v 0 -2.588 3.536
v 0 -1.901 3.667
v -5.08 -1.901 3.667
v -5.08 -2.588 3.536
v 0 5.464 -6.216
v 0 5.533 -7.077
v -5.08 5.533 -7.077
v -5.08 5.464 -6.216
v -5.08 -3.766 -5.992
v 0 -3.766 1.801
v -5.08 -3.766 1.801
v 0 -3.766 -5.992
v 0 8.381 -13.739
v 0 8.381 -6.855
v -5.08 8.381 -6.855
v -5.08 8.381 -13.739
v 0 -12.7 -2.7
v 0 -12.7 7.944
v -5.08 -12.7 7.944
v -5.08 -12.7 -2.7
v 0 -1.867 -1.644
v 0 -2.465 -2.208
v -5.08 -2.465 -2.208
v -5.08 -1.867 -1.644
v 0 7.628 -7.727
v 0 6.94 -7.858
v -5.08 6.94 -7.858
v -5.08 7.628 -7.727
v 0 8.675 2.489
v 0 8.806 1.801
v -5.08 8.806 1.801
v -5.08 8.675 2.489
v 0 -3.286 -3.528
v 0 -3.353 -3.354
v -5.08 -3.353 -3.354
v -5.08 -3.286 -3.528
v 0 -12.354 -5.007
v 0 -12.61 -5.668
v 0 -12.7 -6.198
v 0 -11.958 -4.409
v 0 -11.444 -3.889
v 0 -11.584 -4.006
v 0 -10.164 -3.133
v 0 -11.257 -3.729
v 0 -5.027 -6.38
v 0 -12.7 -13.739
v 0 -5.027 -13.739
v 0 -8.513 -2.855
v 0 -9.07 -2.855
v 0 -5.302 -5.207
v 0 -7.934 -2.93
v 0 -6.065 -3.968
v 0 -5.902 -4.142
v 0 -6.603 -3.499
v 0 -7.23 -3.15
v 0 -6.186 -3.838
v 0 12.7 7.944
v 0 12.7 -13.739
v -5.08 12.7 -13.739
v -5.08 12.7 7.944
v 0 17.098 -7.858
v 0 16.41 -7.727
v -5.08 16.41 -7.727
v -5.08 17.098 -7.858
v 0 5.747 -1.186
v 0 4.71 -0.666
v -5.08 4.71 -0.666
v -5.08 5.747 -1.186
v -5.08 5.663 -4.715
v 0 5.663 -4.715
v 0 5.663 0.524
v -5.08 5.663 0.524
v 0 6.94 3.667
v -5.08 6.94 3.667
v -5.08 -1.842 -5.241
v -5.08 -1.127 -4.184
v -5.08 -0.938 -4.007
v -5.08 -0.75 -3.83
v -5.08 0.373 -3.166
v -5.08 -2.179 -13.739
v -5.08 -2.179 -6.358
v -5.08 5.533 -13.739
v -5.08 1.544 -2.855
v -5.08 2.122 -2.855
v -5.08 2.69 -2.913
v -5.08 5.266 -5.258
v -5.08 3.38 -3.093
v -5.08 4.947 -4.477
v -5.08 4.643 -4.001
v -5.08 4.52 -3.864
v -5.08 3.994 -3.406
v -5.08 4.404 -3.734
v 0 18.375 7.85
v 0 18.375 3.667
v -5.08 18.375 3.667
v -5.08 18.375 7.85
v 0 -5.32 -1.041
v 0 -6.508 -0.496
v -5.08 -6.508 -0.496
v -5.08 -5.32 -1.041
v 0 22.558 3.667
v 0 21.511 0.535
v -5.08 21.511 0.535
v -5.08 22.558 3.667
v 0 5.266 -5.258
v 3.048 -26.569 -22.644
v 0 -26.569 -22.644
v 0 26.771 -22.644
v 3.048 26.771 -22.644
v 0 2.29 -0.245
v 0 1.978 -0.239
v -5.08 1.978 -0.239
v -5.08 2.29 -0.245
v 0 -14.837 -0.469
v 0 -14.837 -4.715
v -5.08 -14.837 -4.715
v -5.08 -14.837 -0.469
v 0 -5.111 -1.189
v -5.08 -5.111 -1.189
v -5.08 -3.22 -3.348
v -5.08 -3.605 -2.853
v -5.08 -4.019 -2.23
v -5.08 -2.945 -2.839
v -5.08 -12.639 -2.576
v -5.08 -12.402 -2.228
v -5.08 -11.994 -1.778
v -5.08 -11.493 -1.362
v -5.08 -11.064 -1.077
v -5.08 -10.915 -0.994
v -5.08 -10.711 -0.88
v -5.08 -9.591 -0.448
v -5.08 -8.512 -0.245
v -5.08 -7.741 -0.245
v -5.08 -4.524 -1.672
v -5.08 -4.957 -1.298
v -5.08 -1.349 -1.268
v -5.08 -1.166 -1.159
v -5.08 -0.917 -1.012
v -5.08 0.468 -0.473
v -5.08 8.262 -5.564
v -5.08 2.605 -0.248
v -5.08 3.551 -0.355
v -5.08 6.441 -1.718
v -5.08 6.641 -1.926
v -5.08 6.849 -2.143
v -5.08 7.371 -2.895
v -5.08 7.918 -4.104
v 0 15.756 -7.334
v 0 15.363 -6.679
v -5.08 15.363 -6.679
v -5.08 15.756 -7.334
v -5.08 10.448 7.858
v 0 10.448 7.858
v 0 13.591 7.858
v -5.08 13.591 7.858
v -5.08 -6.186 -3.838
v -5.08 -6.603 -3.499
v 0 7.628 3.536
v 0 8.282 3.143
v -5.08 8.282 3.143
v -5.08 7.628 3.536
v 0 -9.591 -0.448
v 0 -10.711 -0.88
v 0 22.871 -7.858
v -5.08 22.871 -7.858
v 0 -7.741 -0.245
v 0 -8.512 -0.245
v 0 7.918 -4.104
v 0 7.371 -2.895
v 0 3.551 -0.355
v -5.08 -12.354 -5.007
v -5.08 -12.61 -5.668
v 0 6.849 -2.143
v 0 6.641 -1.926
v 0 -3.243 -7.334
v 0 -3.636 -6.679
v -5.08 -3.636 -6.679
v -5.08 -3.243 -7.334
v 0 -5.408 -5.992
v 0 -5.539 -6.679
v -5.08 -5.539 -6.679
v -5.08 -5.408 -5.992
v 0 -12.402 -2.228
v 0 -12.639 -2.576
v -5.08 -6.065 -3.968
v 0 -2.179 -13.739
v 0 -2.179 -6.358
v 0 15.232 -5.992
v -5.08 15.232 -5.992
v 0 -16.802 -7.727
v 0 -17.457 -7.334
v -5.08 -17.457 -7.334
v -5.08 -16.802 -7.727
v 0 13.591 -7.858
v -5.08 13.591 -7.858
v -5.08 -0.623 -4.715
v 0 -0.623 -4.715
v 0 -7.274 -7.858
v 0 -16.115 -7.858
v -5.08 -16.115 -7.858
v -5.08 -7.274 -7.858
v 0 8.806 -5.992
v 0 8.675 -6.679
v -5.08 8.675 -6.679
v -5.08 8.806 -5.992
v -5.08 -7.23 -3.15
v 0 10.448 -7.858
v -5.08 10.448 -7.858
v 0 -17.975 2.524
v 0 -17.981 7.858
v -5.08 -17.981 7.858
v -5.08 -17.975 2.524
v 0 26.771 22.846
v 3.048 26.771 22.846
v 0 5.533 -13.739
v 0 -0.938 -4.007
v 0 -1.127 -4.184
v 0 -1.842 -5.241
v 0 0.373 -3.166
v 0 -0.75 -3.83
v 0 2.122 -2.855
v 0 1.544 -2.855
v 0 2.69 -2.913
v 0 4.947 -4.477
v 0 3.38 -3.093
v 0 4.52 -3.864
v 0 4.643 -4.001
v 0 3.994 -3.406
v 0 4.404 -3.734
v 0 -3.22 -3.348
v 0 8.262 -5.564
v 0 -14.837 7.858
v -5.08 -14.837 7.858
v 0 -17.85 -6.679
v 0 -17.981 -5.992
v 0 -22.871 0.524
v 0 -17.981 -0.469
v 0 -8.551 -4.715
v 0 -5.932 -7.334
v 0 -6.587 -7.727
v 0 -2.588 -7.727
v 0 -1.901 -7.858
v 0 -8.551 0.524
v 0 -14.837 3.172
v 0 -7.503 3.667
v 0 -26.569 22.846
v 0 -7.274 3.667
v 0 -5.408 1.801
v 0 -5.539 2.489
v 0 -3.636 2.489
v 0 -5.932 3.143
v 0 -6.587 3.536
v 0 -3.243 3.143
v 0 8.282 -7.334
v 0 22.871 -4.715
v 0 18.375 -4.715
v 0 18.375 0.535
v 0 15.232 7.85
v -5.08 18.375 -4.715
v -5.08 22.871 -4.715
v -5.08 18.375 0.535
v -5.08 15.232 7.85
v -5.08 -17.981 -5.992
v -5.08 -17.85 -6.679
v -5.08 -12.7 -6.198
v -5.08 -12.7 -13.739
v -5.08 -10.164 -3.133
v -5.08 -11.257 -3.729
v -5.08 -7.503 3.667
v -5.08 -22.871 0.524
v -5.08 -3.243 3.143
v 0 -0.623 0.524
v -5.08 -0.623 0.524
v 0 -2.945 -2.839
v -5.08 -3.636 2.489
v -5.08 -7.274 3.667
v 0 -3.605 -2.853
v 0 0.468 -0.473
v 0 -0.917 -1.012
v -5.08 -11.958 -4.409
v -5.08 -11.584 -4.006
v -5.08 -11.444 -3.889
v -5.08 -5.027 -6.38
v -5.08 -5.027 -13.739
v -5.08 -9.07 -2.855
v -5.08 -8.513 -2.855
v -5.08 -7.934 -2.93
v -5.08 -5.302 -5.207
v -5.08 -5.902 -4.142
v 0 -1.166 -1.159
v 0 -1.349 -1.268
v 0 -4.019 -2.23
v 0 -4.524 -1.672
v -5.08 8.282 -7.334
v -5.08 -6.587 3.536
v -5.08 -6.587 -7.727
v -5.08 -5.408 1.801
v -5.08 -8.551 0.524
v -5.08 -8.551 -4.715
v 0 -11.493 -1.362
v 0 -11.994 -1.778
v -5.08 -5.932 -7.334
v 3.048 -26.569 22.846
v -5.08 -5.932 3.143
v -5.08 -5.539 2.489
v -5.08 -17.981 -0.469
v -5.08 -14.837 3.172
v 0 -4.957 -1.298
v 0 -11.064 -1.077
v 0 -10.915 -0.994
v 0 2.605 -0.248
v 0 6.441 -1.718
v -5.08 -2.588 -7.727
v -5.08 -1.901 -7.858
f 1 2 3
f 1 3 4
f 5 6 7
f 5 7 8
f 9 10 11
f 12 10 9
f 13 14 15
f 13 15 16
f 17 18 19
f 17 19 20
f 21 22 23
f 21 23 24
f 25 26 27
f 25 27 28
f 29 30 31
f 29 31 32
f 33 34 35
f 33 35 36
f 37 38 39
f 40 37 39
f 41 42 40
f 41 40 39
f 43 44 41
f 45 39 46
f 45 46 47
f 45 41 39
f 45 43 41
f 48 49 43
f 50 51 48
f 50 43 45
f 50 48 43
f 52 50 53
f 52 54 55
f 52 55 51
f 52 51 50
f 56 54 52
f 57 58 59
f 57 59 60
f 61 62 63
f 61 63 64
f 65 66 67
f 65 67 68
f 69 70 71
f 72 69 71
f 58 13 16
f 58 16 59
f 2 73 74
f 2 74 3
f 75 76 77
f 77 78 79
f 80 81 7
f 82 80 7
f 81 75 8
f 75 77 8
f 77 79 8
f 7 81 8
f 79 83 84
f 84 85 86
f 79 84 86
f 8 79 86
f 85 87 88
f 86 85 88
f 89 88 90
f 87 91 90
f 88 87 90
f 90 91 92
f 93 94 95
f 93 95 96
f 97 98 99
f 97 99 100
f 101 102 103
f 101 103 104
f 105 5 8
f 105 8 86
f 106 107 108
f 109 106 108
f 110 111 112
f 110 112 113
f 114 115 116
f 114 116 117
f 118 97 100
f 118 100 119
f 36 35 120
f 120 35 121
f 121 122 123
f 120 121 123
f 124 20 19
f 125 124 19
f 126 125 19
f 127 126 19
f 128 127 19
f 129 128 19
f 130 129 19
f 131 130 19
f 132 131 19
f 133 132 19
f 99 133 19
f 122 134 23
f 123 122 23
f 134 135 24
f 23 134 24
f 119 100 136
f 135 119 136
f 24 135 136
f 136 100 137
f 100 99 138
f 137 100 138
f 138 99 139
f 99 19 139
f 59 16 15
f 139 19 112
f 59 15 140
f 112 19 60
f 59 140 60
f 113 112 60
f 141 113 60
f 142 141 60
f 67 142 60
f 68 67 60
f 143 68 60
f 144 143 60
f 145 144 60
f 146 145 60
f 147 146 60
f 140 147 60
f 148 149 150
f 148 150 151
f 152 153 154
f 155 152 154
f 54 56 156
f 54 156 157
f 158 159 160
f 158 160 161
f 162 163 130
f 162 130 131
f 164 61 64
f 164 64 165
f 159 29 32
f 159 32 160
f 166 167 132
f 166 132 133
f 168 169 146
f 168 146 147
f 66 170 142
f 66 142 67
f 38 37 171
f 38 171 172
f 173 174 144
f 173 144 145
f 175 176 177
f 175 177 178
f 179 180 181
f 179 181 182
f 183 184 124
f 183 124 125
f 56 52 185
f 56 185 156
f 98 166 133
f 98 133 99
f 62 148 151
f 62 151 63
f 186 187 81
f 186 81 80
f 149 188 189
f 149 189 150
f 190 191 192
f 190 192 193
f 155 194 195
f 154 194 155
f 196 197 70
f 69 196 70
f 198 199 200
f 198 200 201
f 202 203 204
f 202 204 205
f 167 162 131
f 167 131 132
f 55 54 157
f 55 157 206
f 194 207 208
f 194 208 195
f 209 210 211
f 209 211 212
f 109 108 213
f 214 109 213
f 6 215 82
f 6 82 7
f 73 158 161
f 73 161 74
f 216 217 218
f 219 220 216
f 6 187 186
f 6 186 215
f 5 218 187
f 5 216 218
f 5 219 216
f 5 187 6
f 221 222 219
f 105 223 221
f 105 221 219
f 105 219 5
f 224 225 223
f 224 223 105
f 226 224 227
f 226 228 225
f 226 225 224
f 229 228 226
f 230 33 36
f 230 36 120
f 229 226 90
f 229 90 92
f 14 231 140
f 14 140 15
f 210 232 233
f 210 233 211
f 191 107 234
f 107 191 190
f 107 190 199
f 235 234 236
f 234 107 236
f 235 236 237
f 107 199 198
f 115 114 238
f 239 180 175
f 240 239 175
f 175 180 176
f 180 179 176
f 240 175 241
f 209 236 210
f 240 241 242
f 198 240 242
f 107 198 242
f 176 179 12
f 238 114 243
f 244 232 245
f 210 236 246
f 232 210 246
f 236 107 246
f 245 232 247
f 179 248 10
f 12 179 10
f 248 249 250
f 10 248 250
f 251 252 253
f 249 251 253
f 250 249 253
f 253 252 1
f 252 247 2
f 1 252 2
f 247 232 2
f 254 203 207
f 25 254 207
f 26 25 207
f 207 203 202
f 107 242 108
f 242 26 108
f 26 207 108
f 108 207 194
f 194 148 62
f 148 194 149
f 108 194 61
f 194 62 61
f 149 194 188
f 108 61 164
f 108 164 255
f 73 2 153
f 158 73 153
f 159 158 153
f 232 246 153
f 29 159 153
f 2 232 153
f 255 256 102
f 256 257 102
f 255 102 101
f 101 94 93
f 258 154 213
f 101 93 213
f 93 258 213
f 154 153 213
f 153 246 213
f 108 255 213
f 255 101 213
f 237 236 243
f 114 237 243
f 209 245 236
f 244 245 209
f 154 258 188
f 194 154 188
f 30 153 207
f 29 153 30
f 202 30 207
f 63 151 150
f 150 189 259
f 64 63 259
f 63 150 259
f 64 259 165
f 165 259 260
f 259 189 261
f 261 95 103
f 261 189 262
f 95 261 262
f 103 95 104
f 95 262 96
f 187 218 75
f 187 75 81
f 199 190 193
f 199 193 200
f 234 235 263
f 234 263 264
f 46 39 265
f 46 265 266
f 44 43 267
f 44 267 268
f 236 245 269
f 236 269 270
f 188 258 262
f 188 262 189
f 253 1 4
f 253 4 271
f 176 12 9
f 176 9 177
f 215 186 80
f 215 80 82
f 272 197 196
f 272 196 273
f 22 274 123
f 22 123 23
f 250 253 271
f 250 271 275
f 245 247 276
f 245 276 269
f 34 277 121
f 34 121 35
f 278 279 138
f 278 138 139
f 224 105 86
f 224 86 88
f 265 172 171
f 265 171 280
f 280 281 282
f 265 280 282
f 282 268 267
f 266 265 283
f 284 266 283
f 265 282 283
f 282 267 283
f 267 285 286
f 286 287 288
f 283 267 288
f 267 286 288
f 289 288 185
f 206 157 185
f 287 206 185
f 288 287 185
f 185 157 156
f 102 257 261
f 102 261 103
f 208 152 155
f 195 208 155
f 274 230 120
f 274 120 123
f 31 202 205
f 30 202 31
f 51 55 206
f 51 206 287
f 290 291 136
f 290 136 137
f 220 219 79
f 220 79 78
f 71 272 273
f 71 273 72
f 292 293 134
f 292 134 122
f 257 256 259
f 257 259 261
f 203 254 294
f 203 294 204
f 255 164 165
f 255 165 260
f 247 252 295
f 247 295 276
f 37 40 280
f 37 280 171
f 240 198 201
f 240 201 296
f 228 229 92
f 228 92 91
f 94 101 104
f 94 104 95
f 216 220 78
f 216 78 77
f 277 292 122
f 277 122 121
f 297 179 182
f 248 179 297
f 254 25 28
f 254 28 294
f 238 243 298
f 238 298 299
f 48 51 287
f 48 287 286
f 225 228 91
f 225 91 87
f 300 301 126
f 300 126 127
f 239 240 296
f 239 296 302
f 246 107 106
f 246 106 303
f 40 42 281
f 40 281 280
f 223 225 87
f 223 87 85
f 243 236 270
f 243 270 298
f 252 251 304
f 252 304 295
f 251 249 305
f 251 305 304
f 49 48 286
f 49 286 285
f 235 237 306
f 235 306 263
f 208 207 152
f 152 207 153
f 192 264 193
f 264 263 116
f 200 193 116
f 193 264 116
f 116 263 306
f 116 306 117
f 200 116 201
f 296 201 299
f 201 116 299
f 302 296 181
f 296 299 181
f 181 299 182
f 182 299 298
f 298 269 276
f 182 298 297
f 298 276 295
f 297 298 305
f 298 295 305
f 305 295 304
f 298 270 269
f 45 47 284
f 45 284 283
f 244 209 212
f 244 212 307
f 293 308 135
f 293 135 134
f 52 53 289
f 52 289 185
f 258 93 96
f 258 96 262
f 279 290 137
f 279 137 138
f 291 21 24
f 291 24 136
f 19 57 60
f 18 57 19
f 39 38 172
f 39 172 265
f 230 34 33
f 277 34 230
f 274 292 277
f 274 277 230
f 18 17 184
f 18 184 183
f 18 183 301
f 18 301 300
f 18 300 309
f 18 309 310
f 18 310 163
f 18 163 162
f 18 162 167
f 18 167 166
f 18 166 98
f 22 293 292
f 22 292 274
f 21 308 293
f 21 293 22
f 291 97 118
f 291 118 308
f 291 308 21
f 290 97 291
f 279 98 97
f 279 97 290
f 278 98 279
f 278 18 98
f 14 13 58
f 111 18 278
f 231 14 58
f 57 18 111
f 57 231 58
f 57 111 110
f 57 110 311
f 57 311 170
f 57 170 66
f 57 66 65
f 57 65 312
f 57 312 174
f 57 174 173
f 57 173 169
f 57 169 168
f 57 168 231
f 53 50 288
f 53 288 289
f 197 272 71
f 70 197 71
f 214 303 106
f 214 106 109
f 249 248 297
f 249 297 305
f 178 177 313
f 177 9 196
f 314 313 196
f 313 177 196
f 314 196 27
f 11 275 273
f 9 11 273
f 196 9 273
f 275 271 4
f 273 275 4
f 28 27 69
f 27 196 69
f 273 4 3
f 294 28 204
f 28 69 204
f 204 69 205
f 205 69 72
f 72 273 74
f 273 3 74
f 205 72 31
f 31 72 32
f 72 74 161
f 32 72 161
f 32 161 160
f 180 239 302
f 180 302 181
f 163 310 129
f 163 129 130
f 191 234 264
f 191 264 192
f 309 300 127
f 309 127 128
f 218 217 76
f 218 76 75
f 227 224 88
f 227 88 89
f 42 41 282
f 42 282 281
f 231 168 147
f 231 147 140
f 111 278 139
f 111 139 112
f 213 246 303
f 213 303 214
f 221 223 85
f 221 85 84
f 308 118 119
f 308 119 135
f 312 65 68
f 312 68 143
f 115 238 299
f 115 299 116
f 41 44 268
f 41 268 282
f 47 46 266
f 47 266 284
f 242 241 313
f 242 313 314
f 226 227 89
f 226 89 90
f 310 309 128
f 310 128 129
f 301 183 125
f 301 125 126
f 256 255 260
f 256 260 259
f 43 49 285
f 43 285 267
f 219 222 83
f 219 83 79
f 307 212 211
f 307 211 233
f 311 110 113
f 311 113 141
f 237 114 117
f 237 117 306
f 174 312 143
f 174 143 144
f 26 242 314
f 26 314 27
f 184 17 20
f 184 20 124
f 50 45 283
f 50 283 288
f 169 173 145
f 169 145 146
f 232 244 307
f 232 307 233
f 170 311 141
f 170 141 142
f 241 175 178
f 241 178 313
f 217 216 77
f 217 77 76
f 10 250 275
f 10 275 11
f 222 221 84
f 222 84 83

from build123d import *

# Parameters (mm, degrees)
F1_DEPTH = 5.08
F2_W     = 53.3400028944
F2_H     = 45.4899612814
F3_DEPTH = 3.048
F4_W     = 3.1429869445
F4_H     = 15.7159869445
F4_W_2   = 6.2865
F4_H_2   = 5.2390130555
F5_DEPTH = 5.08


with BuildPart() as f1:
    # F0 (on Right) → F1 (new body)
    with BuildSketch(Plane.YZ):
        Polygon((12.7, 7.9436706283), (-12.7, 7.9436706283), (-12.7, -2.7003783846), (-12.6387012167, -2.5758128428), (-12.4020947161, -2.2278213751), (-11.9941407446, -1.7776895645), (-11.4932424625, -1.3618151002), (-11.0641874235, -1.077066095), (-10.9145848638, -0.9940952884), (-10.7109237259, -0.8800256144), (-9.5911579813, -0.4484073484), (-8.5116021006, -0.2446854706), (-8.1517541896, -0.2446854706), (-7.7411519552, -0.2446854706), (-6.5080332683, -0.4957845293), (-5.3203845271, -1.0414724693), (-5.1114511593, -1.1891920898), (-4.9565763698, -1.297916646), (-4.5242292241, -1.6715768273), (-4.0193828436, -2.2298136463), (-3.6048082147, -2.8526413552), (-3.3530653122, -3.3535274892), (-3.2864821511, -3.5275232231), (-3.2199232859, -3.3482552594), (-2.9450870447, -2.8394486325), (-2.4652776821, -2.208056587), (-1.8668552954, -1.6438915465), (-1.3488283402, -1.2675466582), (-1.1656001301, -1.1594295018), (-0.9171371863, -1.0118313613), (0.4675763315, -0.4734322183), (1.9781795225, -0.2394618327), (2.2898970768, -0.2446854706), (2.6048945898, -0.2479654292), (3.5507374885, -0.3553537059), (4.7101421411, -0.6658564608), (5.7467305632, -1.1857906512), (6.4413529232, -1.7177149127), (6.6411874426, -1.9259801407), (6.848675199, -2.1434656971), (7.3714034282, -2.8948191942), (7.9183061677, -4.1042006986), (8.2617299893, -5.5640495661), (8.3810233012, -6.8545067898), (8.3810233012, -7.2848859603), (8.3810233012, -13.7391643503), (12.7, -13.7391643503), align=None)
    extrude(amount=-F1_DEPTH)


with BuildPart() as f1b:
    # F0 (on Right) → F1, piece 2 (new body)
    with BuildSketch(Plane.YZ):
        Polygon((-5.0270954813, -13.7391643503), (-5.0270954813, -6.7708071036), (-5.0270954813, -6.3799818051), (-5.3019195745, -5.2074937618), (-5.9023342325, -4.1417744475), (-6.0651416628, -3.9677665656), (-6.18640295, -3.8379409419), (-6.602933406, -3.4991819505), (-7.2297092133, -3.1498784993), (-7.9342564853, -2.9304006718), (-8.512926232, -2.8552653221), (-8.7053626224, -2.8552653221), (-9.0704949112, -2.8552653221), (-10.1638873584, -3.1327376782), (-11.2566359619, -3.7292042378), (-11.4444682622, -3.8886952655), (-11.5835385101, -4.0060084542), (-11.9578911272, -4.4093461876), (-12.3539886555, -5.0071368786), (-12.6097039524, -5.6675261883), (-12.7, -6.1980777265), (-12.7, -6.375365567), (-12.7, -13.7391643503), align=None)
    extrude(amount=-F1_DEPTH)


with BuildPart() as f1c:
    # F0 (on Right) → F1, piece 3 (new body)
    with BuildSketch(Plane.YZ):
        Polygon((2.1224977043, -2.8552653221), (1.9339608203, -2.8552653221), (1.5438886976, -2.8552653221), (0.3733078895, -3.165683041), (-0.7497256657, -3.8300325971), (-0.9382261058, -4.0073204377), (-1.1273825375, -4.1839522864), (-1.8424621212, -5.2411072643), (-2.1792409894, -6.3582247459), (-2.1792409894, -6.7312532315), (-2.1792409894, -13.7391643503), (5.5331688093, -13.7391643503), (5.5331688093, -7.3639694084), (5.5331688093, -7.0766085843), (5.4639252372, -6.2158745393), (5.2655484772, -5.2575799456), (4.9466636058, -4.4772413322), (4.6428422482, -4.001404364), (4.5196615779, -3.8636339516), (4.4042556244, -3.7344643197), (3.99365339, -3.4055937962), (3.3800581573, -3.0925278145), (2.6899305556, -2.912603859), align=None)
    extrude(amount=-F1_DEPTH)


with BuildPart() as f3:
    # F2 (on Right) → F3 (new body)
    with BuildSketch(Plane.YZ):
        with Locations((0.1006424427, 0.1006415114)):
            Rectangle(F2_W, F2_H)
    extrude(amount=F3_DEPTH)

    # F4 (on Right) → F5 (join)
    with BuildSketch(Plane.YZ):
        Polygon((22.8713592142, -4.7150065277), (18.3754403267, -4.7150065277), (18.3754403267, 0.5345287472), (21.5106859241, 0.5345287472), (22.5582480273, 3.6669934723), (18.3754403267, 3.6669934723), (18.3754403267, 7.8501769664), (15.2323782235, 7.8501769664), (15.2323782235, -5.7624934723), (15.2323782235, -5.9916523798), (15.363229538, -6.6791291023), (15.755933799, -7.3339869445), (16.4104910064, -7.7266912055), (17.0979677289, -7.8579934723), (17.32750243, -7.8579934723), (22.8713592142, -7.8579934723), align=None)
        with Locations((12.0192682024, 0)):
            Rectangle(F4_W, F4_H)
        Polygon((6.9401177235, 3.6669934723), (6.7110339747, 3.6669934723), (-1.6709660253, 3.6669934723), (-1.9005007263, 3.6669934723), (-2.5879774488, 3.536066999), (-3.2429104498, 3.1434378968), (-3.6356147107, 2.4885800545), (-3.7663908665, 1.8010281733), (-3.7663908665, 1.5714934723), (-3.7663908665, -5.7624934723), (-3.7663908665, -5.9916523798), (-3.6356147107, -6.6791291023), (-3.2429104498, -7.3339869445), (-2.5879774488, -7.7266912055), (-1.9005007263, -7.8579934723), (-1.6709660253, -7.8579934723), (6.7110339747, -7.8579934723), (6.9401177235, -7.8579934723), (7.6276696047, -7.7266912055), (8.2820764947, -7.3339869445), (8.6747807557, -6.6791291023), (8.8060830225, -5.9916523798), (8.8060830225, -5.7624934723), (8.8060830225, 1.5714934723), (8.8060830225, 1.8010281733), (8.6747807557, 2.4885800545), (8.2820764947, 3.1434378968), (7.6276696047, 3.536066999), align=None)
        with Locations((2.519846078, -2.0955)):
            Rectangle(F4_W_2, F4_H_2, mode=Mode.SUBTRACT)
        Polygon((-17.9749947186, 2.5244307593), (-14.8371937251, 3.1715472544), (-14.8371937251, 7.8579934723), (-17.9806316219, 7.8579934723), align=None)
        Polygon((-7.2740478731, 3.6669934723), (-7.5031316219, 3.6669934723), (-22.8713592142, 0.5240065277), (-8.5506937251, 0.5240065277), (-8.5506937251, -4.7150065277), (-14.8371937251, -4.7150065277), (-14.8371937251, -0.4689151931), (-17.9806316219, -0.4689151931), (-17.9806316219, -5.7624934723), (-17.9806316219, -5.9916523798), (-17.8497803074, -6.6791291023), (-17.4570760464, -7.3339869445), (-16.8021430454, -7.7266912055), (-16.1146663229, -7.8579934723), (-15.8851316219, -7.8579934723), (-7.5031316219, -7.8579934723), (-7.2740478731, -7.8579934723), (-6.5865711506, -7.7266912055), (-5.9317133083, -7.3339869445), (-5.5390090474, -6.6791291023), (-5.4077067806, -5.9916523798), (-5.4077067806, -5.7624934723), (-5.4077067806, 1.5714934723), (-5.4077067806, 1.8010281733), (-5.5390090474, 2.4885800545), (-5.9317133083, 3.1434378968), (-6.5865711506, 3.536066999), align=None)
    extrude(amount=-F5_DEPTH)


solid = Compound([f1.part, f1b.part, f1c.part, f3.part])
